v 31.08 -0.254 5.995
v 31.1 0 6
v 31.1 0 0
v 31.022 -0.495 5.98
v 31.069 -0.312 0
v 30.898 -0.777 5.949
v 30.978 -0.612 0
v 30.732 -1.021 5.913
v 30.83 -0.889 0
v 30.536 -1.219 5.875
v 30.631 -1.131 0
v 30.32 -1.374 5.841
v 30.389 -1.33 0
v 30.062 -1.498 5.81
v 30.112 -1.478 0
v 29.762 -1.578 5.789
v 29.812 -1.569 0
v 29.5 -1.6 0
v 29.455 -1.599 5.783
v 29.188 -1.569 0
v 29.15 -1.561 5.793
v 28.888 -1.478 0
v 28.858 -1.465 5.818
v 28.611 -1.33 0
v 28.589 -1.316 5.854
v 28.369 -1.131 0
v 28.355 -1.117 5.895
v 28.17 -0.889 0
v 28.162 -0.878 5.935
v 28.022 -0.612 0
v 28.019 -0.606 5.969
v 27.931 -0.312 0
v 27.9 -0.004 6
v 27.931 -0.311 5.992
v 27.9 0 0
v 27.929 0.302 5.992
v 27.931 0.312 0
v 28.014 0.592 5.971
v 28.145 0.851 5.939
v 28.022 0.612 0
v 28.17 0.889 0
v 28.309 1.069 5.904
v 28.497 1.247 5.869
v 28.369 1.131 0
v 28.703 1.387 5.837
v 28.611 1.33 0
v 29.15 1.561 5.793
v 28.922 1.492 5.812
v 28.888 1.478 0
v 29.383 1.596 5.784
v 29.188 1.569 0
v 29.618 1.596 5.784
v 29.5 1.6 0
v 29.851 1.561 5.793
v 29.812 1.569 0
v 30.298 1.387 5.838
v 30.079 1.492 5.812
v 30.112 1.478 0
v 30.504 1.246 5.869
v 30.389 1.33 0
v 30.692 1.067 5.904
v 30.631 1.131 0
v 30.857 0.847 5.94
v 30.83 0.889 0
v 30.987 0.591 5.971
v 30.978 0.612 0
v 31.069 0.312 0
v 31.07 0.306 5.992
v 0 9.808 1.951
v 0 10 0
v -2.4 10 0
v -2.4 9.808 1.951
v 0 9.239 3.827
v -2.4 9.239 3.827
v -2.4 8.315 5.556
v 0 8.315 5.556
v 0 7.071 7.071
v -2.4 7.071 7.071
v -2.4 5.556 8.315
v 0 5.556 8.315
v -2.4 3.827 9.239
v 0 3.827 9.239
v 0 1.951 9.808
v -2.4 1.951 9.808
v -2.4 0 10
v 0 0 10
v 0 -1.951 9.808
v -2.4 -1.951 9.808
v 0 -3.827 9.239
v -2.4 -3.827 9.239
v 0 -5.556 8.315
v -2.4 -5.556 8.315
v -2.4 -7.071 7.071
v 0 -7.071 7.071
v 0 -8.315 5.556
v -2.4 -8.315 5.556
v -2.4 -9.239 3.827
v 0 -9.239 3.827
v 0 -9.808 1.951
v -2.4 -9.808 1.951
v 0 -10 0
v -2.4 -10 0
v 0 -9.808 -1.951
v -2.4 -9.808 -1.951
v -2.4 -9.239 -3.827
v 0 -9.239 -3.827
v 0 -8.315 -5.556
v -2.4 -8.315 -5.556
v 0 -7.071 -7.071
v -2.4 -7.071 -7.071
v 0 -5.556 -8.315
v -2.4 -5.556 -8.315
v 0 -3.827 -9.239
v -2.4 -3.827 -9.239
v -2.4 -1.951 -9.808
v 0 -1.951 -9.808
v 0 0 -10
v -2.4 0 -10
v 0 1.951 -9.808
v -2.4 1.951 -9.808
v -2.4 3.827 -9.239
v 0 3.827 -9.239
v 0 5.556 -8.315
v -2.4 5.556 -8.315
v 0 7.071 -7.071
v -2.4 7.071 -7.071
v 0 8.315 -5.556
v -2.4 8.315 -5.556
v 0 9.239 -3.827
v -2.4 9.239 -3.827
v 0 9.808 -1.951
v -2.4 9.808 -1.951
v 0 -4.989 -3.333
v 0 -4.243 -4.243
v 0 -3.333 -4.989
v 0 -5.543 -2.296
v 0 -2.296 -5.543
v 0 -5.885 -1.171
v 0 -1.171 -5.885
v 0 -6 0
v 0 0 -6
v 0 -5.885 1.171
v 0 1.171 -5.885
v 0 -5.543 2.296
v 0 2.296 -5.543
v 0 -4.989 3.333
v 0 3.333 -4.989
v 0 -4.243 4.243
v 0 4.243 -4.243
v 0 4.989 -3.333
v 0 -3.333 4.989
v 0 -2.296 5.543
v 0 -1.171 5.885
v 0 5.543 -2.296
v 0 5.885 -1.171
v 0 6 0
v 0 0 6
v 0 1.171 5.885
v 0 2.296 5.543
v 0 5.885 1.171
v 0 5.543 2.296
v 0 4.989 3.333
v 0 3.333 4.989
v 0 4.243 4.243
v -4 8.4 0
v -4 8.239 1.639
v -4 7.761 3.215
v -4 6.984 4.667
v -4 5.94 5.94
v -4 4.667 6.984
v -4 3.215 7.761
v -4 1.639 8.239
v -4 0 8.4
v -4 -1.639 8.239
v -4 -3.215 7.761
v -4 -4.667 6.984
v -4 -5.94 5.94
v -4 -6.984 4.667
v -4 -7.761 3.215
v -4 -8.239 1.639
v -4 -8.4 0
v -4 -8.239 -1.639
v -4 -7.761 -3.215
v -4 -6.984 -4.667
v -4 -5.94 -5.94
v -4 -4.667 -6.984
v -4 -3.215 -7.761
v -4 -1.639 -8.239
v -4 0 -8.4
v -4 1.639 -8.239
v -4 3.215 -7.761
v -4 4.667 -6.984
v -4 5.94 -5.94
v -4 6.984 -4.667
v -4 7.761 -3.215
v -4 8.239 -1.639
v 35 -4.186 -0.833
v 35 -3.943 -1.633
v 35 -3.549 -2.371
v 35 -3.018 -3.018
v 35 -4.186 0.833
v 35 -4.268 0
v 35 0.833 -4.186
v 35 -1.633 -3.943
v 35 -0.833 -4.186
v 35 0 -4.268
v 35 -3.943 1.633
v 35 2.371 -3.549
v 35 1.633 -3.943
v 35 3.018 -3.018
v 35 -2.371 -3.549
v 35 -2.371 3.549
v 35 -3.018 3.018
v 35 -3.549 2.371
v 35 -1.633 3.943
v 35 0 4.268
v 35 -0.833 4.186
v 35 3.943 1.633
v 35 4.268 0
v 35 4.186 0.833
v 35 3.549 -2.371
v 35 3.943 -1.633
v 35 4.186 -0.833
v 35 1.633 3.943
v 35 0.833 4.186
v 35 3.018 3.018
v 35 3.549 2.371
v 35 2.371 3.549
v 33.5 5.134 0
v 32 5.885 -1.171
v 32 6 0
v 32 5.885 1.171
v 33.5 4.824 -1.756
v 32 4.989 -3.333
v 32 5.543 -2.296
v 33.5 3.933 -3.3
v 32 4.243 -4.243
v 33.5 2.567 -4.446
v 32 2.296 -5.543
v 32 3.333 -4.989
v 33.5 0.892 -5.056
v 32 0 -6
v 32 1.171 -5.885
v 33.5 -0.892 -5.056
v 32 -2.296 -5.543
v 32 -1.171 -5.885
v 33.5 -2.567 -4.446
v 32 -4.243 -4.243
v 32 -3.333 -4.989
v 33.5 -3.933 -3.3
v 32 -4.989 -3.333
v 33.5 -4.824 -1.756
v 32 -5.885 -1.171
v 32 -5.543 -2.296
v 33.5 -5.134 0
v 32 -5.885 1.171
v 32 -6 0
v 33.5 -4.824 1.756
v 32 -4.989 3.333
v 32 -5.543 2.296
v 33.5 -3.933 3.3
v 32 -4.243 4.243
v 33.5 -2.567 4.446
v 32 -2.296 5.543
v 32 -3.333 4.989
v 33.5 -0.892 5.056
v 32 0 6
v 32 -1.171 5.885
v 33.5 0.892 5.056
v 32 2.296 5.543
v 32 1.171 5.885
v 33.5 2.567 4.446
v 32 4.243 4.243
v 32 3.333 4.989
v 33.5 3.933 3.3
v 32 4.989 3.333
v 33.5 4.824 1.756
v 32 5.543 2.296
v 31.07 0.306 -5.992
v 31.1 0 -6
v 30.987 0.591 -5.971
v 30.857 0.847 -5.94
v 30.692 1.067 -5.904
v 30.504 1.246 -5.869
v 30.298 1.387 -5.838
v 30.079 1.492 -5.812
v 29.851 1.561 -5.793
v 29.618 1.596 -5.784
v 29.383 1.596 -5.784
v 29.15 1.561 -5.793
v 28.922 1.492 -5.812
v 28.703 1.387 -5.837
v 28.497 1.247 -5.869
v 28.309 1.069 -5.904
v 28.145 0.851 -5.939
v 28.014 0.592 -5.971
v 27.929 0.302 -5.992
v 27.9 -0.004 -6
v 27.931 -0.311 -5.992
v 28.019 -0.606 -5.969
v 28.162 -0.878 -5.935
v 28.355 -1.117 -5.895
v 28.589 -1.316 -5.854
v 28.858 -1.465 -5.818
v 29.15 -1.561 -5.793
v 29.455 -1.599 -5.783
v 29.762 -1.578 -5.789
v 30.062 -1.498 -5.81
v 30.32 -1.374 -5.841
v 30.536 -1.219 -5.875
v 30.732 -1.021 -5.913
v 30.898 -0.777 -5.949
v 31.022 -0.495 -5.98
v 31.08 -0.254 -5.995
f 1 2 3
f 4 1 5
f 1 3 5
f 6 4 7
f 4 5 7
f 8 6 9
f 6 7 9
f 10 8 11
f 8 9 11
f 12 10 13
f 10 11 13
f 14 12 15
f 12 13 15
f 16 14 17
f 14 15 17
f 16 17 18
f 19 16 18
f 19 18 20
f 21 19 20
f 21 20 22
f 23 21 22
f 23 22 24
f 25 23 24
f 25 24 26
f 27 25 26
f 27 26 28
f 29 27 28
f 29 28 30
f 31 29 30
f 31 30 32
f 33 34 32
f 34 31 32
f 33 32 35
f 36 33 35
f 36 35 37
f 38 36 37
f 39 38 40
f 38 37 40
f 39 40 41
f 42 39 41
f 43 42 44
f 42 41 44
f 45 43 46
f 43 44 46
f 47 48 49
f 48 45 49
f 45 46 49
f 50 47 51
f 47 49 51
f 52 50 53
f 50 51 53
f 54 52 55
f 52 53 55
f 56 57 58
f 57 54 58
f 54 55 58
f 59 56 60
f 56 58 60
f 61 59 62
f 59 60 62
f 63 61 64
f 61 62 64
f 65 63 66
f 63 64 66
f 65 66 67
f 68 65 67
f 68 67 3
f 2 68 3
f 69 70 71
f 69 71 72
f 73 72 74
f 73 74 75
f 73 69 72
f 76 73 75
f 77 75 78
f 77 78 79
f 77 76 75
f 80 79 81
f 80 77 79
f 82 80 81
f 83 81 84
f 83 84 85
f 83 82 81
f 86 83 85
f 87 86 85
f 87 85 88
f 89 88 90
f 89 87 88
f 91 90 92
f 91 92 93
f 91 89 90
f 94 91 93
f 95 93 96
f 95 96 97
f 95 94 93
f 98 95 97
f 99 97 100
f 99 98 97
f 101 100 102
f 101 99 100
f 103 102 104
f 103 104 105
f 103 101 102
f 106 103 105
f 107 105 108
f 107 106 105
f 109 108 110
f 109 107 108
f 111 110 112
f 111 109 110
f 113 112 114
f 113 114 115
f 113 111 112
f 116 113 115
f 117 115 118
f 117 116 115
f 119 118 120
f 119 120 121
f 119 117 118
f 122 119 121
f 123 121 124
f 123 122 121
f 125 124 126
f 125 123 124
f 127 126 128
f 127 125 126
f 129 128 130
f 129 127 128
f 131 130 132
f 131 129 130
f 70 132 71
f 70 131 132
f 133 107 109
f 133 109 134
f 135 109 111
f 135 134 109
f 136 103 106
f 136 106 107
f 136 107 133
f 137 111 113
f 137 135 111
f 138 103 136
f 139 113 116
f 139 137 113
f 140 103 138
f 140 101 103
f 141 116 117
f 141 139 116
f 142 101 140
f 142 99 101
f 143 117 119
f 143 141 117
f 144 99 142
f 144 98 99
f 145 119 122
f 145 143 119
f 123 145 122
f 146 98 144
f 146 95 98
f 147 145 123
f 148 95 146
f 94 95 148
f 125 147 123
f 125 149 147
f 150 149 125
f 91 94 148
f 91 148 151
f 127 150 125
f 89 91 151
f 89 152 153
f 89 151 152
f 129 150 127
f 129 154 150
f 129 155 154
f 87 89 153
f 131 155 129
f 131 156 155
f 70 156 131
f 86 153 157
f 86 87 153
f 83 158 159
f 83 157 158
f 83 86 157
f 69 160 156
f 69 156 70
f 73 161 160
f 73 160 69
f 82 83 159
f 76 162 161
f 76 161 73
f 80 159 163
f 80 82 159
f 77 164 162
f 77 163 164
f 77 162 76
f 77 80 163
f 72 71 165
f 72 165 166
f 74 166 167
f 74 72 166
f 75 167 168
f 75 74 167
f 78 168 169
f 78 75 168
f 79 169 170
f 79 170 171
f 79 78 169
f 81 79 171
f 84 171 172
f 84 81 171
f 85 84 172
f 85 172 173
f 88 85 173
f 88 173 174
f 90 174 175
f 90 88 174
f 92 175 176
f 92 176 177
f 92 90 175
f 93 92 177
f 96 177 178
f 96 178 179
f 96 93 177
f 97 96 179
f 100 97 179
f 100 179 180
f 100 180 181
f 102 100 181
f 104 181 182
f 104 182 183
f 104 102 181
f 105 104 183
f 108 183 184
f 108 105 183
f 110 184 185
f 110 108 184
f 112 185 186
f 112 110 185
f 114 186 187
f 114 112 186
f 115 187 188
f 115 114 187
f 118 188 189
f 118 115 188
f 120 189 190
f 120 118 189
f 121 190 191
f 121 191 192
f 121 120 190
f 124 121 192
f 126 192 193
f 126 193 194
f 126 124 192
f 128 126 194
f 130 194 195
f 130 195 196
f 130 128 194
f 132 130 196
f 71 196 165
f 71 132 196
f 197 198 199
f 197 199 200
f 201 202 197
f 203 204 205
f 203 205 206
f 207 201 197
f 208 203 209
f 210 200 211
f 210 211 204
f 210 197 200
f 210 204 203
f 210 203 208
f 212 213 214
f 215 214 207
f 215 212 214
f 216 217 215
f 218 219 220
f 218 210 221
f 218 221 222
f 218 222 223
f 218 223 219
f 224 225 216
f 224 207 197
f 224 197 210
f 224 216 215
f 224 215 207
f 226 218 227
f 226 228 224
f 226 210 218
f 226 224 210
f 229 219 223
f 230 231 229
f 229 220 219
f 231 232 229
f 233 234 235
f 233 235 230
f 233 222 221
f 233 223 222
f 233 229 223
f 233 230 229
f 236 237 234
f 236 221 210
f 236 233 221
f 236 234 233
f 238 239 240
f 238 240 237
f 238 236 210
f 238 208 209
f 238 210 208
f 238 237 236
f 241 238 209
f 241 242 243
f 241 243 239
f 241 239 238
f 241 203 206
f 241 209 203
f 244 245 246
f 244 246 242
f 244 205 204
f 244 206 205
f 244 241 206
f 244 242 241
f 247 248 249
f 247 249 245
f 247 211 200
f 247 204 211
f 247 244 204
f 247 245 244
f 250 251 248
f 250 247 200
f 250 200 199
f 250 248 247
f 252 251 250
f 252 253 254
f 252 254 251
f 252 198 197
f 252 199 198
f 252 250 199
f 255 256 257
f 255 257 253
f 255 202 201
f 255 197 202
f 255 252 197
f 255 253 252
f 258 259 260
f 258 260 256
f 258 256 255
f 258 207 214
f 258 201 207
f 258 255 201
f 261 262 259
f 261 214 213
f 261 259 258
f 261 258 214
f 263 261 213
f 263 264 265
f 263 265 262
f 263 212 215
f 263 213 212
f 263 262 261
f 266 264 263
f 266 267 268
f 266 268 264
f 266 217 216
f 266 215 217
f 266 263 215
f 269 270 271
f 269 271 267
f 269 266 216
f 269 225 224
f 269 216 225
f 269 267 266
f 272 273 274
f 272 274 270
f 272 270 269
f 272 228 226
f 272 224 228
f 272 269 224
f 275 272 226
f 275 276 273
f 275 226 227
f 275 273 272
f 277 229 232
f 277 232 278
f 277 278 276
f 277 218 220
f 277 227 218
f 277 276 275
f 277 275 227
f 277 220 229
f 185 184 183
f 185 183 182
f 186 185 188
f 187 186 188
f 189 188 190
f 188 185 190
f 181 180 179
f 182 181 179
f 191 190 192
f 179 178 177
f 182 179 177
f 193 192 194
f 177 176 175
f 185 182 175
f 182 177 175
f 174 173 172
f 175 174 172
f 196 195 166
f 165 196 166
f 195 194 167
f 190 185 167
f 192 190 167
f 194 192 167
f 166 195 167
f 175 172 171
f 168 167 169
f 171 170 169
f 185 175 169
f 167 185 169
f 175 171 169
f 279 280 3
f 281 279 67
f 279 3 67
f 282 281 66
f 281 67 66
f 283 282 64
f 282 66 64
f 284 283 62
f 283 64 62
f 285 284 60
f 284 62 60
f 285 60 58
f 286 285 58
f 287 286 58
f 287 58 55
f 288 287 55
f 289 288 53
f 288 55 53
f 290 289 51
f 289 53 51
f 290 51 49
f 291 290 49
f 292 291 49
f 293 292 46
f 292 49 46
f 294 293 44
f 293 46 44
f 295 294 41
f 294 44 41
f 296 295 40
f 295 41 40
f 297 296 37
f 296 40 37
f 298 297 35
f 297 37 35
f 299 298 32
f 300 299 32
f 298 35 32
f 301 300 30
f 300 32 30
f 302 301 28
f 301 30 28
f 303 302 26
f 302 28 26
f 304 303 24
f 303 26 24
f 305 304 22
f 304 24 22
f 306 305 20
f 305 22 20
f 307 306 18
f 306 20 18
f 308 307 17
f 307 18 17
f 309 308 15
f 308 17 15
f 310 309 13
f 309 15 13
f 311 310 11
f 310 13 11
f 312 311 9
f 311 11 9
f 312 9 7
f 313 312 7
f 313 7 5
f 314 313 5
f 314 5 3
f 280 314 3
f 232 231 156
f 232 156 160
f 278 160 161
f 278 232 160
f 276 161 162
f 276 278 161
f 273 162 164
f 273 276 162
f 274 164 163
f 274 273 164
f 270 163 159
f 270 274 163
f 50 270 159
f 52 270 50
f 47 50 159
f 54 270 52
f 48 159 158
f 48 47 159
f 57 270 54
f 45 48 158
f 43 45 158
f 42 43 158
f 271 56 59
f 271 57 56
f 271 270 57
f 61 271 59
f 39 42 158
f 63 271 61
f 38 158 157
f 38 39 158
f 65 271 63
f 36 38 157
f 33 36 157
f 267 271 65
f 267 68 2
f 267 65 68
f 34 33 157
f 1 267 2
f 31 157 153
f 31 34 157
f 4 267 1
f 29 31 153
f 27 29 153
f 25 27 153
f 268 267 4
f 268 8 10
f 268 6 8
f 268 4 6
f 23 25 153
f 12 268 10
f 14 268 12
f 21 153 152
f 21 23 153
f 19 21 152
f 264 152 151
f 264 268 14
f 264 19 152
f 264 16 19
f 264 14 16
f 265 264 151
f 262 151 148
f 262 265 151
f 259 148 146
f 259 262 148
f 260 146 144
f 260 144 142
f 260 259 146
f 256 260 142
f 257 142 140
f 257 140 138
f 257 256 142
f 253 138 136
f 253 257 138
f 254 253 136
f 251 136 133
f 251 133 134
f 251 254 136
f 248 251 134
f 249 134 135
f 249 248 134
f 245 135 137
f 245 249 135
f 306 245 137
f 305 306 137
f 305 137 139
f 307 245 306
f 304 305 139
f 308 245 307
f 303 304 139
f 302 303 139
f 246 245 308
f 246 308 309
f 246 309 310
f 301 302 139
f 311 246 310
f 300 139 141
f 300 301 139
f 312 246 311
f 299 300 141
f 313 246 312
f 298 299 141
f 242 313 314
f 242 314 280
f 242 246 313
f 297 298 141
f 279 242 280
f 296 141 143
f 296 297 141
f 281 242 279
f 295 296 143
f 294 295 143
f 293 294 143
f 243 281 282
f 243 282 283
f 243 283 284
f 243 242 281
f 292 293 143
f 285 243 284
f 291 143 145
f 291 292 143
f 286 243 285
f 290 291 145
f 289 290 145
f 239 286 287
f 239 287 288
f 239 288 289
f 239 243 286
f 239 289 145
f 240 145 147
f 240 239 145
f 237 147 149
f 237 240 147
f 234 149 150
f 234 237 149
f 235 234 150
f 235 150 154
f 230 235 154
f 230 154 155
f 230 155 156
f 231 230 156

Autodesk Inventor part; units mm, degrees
ref_plane "YZ Plane" through (0, 0, 0) normal (1, 0, 0) x (0, 1, 0)
ref_plane "XZ Plane" through (0, 0, 0) normal (0, 1, 0) x (-1, 0, 0)
sketch "Skizze1" plane through (0, 0, 0) normal (0, 0, 1) x (1, 0, 0)
  line L0 (-4, 0) -> (-4, 10)
  line L1 (-4, 10) -> (0, 10)
  line L2 (0, 10) -> (0, 6)
  line L3 (0, 6) -> (35, 6)
  line L4 (35, 6) -> (35, 0)
  line L5 (-4, 0) -> (35, 0)
  line L6 (-4, 0) -> (17, 0) projected
  line L7 (0, -0.98) -> (0, 3.08) projected
  circle A0 centre (29.5, 0) radius 1.6
  dimension "d0" = 12
  dimension "d1" = 20
  dimension "d2" = 4
  dimension "d3" = 35
  dimension "d5" = 5.5
  dimension "d6" = 3.2
revolve "Körper" add sketch "Skizze1" angle 360 about axis through (-4, 0, 0) along (1, 0, 0) picked at (29.9216, 0.9202) contours L0 L1 L2 L3 L4 L5 A0 | A0 L5
extrude "Bohrung" cut sketch "Skizze1" along normal through all both and the other way through all contours A0 L5 | L5 A0
chamfer "Fase1" distance 1.6 angle 45 1 edges at (-4, -10, 0) measured on face at (-2.6667, 9.9676, -0.8047)
chamfer "Fase2" distance 3 angle 30 1 edges at (35, -6, 0) measured on face at (21.4513, 2.8362, -5.2873)
ref_plane "Work Plane1" through (17.5, 0, 6) normal (0, 0, 1) x (1, 0, 0)
equation "\"d0\" = NND"
equation "\"d1\" = KOD"
equation "\"d2\" = KOH"
equation "\"d3\" = NLG"
equation "\"d5\" = DIST"
equation "\"d6\" = BOR"
equation "\"d7\" = NND"
equation "\"d9\" = PHH2"
equation "\"d10\" = FAWI2"
equation "\"d16\" = PHH2"
equation "\"d11\" = PHH1"
equation "\"d12\" = FAWI1"
equation "\"d17\" = PHH1"
equation "\"PHH1\" = 3"
equation "\"PHH2\" = 1.6"
equation "\"KOD\" = 20"
equation "\"KOH\" = 4"
equation "\"NND\" = 12"
equation "\"FAWI1\" = 30deg"
equation "\"FAWI2\" = 45deg"
equation "\"DIST\" = 5.5"
equation "\"BOR\" = 3.2"
equation "\"NLG\" = 35"
properties part number "IS 6863 - B12 x 35" material "Stahl, weich"
